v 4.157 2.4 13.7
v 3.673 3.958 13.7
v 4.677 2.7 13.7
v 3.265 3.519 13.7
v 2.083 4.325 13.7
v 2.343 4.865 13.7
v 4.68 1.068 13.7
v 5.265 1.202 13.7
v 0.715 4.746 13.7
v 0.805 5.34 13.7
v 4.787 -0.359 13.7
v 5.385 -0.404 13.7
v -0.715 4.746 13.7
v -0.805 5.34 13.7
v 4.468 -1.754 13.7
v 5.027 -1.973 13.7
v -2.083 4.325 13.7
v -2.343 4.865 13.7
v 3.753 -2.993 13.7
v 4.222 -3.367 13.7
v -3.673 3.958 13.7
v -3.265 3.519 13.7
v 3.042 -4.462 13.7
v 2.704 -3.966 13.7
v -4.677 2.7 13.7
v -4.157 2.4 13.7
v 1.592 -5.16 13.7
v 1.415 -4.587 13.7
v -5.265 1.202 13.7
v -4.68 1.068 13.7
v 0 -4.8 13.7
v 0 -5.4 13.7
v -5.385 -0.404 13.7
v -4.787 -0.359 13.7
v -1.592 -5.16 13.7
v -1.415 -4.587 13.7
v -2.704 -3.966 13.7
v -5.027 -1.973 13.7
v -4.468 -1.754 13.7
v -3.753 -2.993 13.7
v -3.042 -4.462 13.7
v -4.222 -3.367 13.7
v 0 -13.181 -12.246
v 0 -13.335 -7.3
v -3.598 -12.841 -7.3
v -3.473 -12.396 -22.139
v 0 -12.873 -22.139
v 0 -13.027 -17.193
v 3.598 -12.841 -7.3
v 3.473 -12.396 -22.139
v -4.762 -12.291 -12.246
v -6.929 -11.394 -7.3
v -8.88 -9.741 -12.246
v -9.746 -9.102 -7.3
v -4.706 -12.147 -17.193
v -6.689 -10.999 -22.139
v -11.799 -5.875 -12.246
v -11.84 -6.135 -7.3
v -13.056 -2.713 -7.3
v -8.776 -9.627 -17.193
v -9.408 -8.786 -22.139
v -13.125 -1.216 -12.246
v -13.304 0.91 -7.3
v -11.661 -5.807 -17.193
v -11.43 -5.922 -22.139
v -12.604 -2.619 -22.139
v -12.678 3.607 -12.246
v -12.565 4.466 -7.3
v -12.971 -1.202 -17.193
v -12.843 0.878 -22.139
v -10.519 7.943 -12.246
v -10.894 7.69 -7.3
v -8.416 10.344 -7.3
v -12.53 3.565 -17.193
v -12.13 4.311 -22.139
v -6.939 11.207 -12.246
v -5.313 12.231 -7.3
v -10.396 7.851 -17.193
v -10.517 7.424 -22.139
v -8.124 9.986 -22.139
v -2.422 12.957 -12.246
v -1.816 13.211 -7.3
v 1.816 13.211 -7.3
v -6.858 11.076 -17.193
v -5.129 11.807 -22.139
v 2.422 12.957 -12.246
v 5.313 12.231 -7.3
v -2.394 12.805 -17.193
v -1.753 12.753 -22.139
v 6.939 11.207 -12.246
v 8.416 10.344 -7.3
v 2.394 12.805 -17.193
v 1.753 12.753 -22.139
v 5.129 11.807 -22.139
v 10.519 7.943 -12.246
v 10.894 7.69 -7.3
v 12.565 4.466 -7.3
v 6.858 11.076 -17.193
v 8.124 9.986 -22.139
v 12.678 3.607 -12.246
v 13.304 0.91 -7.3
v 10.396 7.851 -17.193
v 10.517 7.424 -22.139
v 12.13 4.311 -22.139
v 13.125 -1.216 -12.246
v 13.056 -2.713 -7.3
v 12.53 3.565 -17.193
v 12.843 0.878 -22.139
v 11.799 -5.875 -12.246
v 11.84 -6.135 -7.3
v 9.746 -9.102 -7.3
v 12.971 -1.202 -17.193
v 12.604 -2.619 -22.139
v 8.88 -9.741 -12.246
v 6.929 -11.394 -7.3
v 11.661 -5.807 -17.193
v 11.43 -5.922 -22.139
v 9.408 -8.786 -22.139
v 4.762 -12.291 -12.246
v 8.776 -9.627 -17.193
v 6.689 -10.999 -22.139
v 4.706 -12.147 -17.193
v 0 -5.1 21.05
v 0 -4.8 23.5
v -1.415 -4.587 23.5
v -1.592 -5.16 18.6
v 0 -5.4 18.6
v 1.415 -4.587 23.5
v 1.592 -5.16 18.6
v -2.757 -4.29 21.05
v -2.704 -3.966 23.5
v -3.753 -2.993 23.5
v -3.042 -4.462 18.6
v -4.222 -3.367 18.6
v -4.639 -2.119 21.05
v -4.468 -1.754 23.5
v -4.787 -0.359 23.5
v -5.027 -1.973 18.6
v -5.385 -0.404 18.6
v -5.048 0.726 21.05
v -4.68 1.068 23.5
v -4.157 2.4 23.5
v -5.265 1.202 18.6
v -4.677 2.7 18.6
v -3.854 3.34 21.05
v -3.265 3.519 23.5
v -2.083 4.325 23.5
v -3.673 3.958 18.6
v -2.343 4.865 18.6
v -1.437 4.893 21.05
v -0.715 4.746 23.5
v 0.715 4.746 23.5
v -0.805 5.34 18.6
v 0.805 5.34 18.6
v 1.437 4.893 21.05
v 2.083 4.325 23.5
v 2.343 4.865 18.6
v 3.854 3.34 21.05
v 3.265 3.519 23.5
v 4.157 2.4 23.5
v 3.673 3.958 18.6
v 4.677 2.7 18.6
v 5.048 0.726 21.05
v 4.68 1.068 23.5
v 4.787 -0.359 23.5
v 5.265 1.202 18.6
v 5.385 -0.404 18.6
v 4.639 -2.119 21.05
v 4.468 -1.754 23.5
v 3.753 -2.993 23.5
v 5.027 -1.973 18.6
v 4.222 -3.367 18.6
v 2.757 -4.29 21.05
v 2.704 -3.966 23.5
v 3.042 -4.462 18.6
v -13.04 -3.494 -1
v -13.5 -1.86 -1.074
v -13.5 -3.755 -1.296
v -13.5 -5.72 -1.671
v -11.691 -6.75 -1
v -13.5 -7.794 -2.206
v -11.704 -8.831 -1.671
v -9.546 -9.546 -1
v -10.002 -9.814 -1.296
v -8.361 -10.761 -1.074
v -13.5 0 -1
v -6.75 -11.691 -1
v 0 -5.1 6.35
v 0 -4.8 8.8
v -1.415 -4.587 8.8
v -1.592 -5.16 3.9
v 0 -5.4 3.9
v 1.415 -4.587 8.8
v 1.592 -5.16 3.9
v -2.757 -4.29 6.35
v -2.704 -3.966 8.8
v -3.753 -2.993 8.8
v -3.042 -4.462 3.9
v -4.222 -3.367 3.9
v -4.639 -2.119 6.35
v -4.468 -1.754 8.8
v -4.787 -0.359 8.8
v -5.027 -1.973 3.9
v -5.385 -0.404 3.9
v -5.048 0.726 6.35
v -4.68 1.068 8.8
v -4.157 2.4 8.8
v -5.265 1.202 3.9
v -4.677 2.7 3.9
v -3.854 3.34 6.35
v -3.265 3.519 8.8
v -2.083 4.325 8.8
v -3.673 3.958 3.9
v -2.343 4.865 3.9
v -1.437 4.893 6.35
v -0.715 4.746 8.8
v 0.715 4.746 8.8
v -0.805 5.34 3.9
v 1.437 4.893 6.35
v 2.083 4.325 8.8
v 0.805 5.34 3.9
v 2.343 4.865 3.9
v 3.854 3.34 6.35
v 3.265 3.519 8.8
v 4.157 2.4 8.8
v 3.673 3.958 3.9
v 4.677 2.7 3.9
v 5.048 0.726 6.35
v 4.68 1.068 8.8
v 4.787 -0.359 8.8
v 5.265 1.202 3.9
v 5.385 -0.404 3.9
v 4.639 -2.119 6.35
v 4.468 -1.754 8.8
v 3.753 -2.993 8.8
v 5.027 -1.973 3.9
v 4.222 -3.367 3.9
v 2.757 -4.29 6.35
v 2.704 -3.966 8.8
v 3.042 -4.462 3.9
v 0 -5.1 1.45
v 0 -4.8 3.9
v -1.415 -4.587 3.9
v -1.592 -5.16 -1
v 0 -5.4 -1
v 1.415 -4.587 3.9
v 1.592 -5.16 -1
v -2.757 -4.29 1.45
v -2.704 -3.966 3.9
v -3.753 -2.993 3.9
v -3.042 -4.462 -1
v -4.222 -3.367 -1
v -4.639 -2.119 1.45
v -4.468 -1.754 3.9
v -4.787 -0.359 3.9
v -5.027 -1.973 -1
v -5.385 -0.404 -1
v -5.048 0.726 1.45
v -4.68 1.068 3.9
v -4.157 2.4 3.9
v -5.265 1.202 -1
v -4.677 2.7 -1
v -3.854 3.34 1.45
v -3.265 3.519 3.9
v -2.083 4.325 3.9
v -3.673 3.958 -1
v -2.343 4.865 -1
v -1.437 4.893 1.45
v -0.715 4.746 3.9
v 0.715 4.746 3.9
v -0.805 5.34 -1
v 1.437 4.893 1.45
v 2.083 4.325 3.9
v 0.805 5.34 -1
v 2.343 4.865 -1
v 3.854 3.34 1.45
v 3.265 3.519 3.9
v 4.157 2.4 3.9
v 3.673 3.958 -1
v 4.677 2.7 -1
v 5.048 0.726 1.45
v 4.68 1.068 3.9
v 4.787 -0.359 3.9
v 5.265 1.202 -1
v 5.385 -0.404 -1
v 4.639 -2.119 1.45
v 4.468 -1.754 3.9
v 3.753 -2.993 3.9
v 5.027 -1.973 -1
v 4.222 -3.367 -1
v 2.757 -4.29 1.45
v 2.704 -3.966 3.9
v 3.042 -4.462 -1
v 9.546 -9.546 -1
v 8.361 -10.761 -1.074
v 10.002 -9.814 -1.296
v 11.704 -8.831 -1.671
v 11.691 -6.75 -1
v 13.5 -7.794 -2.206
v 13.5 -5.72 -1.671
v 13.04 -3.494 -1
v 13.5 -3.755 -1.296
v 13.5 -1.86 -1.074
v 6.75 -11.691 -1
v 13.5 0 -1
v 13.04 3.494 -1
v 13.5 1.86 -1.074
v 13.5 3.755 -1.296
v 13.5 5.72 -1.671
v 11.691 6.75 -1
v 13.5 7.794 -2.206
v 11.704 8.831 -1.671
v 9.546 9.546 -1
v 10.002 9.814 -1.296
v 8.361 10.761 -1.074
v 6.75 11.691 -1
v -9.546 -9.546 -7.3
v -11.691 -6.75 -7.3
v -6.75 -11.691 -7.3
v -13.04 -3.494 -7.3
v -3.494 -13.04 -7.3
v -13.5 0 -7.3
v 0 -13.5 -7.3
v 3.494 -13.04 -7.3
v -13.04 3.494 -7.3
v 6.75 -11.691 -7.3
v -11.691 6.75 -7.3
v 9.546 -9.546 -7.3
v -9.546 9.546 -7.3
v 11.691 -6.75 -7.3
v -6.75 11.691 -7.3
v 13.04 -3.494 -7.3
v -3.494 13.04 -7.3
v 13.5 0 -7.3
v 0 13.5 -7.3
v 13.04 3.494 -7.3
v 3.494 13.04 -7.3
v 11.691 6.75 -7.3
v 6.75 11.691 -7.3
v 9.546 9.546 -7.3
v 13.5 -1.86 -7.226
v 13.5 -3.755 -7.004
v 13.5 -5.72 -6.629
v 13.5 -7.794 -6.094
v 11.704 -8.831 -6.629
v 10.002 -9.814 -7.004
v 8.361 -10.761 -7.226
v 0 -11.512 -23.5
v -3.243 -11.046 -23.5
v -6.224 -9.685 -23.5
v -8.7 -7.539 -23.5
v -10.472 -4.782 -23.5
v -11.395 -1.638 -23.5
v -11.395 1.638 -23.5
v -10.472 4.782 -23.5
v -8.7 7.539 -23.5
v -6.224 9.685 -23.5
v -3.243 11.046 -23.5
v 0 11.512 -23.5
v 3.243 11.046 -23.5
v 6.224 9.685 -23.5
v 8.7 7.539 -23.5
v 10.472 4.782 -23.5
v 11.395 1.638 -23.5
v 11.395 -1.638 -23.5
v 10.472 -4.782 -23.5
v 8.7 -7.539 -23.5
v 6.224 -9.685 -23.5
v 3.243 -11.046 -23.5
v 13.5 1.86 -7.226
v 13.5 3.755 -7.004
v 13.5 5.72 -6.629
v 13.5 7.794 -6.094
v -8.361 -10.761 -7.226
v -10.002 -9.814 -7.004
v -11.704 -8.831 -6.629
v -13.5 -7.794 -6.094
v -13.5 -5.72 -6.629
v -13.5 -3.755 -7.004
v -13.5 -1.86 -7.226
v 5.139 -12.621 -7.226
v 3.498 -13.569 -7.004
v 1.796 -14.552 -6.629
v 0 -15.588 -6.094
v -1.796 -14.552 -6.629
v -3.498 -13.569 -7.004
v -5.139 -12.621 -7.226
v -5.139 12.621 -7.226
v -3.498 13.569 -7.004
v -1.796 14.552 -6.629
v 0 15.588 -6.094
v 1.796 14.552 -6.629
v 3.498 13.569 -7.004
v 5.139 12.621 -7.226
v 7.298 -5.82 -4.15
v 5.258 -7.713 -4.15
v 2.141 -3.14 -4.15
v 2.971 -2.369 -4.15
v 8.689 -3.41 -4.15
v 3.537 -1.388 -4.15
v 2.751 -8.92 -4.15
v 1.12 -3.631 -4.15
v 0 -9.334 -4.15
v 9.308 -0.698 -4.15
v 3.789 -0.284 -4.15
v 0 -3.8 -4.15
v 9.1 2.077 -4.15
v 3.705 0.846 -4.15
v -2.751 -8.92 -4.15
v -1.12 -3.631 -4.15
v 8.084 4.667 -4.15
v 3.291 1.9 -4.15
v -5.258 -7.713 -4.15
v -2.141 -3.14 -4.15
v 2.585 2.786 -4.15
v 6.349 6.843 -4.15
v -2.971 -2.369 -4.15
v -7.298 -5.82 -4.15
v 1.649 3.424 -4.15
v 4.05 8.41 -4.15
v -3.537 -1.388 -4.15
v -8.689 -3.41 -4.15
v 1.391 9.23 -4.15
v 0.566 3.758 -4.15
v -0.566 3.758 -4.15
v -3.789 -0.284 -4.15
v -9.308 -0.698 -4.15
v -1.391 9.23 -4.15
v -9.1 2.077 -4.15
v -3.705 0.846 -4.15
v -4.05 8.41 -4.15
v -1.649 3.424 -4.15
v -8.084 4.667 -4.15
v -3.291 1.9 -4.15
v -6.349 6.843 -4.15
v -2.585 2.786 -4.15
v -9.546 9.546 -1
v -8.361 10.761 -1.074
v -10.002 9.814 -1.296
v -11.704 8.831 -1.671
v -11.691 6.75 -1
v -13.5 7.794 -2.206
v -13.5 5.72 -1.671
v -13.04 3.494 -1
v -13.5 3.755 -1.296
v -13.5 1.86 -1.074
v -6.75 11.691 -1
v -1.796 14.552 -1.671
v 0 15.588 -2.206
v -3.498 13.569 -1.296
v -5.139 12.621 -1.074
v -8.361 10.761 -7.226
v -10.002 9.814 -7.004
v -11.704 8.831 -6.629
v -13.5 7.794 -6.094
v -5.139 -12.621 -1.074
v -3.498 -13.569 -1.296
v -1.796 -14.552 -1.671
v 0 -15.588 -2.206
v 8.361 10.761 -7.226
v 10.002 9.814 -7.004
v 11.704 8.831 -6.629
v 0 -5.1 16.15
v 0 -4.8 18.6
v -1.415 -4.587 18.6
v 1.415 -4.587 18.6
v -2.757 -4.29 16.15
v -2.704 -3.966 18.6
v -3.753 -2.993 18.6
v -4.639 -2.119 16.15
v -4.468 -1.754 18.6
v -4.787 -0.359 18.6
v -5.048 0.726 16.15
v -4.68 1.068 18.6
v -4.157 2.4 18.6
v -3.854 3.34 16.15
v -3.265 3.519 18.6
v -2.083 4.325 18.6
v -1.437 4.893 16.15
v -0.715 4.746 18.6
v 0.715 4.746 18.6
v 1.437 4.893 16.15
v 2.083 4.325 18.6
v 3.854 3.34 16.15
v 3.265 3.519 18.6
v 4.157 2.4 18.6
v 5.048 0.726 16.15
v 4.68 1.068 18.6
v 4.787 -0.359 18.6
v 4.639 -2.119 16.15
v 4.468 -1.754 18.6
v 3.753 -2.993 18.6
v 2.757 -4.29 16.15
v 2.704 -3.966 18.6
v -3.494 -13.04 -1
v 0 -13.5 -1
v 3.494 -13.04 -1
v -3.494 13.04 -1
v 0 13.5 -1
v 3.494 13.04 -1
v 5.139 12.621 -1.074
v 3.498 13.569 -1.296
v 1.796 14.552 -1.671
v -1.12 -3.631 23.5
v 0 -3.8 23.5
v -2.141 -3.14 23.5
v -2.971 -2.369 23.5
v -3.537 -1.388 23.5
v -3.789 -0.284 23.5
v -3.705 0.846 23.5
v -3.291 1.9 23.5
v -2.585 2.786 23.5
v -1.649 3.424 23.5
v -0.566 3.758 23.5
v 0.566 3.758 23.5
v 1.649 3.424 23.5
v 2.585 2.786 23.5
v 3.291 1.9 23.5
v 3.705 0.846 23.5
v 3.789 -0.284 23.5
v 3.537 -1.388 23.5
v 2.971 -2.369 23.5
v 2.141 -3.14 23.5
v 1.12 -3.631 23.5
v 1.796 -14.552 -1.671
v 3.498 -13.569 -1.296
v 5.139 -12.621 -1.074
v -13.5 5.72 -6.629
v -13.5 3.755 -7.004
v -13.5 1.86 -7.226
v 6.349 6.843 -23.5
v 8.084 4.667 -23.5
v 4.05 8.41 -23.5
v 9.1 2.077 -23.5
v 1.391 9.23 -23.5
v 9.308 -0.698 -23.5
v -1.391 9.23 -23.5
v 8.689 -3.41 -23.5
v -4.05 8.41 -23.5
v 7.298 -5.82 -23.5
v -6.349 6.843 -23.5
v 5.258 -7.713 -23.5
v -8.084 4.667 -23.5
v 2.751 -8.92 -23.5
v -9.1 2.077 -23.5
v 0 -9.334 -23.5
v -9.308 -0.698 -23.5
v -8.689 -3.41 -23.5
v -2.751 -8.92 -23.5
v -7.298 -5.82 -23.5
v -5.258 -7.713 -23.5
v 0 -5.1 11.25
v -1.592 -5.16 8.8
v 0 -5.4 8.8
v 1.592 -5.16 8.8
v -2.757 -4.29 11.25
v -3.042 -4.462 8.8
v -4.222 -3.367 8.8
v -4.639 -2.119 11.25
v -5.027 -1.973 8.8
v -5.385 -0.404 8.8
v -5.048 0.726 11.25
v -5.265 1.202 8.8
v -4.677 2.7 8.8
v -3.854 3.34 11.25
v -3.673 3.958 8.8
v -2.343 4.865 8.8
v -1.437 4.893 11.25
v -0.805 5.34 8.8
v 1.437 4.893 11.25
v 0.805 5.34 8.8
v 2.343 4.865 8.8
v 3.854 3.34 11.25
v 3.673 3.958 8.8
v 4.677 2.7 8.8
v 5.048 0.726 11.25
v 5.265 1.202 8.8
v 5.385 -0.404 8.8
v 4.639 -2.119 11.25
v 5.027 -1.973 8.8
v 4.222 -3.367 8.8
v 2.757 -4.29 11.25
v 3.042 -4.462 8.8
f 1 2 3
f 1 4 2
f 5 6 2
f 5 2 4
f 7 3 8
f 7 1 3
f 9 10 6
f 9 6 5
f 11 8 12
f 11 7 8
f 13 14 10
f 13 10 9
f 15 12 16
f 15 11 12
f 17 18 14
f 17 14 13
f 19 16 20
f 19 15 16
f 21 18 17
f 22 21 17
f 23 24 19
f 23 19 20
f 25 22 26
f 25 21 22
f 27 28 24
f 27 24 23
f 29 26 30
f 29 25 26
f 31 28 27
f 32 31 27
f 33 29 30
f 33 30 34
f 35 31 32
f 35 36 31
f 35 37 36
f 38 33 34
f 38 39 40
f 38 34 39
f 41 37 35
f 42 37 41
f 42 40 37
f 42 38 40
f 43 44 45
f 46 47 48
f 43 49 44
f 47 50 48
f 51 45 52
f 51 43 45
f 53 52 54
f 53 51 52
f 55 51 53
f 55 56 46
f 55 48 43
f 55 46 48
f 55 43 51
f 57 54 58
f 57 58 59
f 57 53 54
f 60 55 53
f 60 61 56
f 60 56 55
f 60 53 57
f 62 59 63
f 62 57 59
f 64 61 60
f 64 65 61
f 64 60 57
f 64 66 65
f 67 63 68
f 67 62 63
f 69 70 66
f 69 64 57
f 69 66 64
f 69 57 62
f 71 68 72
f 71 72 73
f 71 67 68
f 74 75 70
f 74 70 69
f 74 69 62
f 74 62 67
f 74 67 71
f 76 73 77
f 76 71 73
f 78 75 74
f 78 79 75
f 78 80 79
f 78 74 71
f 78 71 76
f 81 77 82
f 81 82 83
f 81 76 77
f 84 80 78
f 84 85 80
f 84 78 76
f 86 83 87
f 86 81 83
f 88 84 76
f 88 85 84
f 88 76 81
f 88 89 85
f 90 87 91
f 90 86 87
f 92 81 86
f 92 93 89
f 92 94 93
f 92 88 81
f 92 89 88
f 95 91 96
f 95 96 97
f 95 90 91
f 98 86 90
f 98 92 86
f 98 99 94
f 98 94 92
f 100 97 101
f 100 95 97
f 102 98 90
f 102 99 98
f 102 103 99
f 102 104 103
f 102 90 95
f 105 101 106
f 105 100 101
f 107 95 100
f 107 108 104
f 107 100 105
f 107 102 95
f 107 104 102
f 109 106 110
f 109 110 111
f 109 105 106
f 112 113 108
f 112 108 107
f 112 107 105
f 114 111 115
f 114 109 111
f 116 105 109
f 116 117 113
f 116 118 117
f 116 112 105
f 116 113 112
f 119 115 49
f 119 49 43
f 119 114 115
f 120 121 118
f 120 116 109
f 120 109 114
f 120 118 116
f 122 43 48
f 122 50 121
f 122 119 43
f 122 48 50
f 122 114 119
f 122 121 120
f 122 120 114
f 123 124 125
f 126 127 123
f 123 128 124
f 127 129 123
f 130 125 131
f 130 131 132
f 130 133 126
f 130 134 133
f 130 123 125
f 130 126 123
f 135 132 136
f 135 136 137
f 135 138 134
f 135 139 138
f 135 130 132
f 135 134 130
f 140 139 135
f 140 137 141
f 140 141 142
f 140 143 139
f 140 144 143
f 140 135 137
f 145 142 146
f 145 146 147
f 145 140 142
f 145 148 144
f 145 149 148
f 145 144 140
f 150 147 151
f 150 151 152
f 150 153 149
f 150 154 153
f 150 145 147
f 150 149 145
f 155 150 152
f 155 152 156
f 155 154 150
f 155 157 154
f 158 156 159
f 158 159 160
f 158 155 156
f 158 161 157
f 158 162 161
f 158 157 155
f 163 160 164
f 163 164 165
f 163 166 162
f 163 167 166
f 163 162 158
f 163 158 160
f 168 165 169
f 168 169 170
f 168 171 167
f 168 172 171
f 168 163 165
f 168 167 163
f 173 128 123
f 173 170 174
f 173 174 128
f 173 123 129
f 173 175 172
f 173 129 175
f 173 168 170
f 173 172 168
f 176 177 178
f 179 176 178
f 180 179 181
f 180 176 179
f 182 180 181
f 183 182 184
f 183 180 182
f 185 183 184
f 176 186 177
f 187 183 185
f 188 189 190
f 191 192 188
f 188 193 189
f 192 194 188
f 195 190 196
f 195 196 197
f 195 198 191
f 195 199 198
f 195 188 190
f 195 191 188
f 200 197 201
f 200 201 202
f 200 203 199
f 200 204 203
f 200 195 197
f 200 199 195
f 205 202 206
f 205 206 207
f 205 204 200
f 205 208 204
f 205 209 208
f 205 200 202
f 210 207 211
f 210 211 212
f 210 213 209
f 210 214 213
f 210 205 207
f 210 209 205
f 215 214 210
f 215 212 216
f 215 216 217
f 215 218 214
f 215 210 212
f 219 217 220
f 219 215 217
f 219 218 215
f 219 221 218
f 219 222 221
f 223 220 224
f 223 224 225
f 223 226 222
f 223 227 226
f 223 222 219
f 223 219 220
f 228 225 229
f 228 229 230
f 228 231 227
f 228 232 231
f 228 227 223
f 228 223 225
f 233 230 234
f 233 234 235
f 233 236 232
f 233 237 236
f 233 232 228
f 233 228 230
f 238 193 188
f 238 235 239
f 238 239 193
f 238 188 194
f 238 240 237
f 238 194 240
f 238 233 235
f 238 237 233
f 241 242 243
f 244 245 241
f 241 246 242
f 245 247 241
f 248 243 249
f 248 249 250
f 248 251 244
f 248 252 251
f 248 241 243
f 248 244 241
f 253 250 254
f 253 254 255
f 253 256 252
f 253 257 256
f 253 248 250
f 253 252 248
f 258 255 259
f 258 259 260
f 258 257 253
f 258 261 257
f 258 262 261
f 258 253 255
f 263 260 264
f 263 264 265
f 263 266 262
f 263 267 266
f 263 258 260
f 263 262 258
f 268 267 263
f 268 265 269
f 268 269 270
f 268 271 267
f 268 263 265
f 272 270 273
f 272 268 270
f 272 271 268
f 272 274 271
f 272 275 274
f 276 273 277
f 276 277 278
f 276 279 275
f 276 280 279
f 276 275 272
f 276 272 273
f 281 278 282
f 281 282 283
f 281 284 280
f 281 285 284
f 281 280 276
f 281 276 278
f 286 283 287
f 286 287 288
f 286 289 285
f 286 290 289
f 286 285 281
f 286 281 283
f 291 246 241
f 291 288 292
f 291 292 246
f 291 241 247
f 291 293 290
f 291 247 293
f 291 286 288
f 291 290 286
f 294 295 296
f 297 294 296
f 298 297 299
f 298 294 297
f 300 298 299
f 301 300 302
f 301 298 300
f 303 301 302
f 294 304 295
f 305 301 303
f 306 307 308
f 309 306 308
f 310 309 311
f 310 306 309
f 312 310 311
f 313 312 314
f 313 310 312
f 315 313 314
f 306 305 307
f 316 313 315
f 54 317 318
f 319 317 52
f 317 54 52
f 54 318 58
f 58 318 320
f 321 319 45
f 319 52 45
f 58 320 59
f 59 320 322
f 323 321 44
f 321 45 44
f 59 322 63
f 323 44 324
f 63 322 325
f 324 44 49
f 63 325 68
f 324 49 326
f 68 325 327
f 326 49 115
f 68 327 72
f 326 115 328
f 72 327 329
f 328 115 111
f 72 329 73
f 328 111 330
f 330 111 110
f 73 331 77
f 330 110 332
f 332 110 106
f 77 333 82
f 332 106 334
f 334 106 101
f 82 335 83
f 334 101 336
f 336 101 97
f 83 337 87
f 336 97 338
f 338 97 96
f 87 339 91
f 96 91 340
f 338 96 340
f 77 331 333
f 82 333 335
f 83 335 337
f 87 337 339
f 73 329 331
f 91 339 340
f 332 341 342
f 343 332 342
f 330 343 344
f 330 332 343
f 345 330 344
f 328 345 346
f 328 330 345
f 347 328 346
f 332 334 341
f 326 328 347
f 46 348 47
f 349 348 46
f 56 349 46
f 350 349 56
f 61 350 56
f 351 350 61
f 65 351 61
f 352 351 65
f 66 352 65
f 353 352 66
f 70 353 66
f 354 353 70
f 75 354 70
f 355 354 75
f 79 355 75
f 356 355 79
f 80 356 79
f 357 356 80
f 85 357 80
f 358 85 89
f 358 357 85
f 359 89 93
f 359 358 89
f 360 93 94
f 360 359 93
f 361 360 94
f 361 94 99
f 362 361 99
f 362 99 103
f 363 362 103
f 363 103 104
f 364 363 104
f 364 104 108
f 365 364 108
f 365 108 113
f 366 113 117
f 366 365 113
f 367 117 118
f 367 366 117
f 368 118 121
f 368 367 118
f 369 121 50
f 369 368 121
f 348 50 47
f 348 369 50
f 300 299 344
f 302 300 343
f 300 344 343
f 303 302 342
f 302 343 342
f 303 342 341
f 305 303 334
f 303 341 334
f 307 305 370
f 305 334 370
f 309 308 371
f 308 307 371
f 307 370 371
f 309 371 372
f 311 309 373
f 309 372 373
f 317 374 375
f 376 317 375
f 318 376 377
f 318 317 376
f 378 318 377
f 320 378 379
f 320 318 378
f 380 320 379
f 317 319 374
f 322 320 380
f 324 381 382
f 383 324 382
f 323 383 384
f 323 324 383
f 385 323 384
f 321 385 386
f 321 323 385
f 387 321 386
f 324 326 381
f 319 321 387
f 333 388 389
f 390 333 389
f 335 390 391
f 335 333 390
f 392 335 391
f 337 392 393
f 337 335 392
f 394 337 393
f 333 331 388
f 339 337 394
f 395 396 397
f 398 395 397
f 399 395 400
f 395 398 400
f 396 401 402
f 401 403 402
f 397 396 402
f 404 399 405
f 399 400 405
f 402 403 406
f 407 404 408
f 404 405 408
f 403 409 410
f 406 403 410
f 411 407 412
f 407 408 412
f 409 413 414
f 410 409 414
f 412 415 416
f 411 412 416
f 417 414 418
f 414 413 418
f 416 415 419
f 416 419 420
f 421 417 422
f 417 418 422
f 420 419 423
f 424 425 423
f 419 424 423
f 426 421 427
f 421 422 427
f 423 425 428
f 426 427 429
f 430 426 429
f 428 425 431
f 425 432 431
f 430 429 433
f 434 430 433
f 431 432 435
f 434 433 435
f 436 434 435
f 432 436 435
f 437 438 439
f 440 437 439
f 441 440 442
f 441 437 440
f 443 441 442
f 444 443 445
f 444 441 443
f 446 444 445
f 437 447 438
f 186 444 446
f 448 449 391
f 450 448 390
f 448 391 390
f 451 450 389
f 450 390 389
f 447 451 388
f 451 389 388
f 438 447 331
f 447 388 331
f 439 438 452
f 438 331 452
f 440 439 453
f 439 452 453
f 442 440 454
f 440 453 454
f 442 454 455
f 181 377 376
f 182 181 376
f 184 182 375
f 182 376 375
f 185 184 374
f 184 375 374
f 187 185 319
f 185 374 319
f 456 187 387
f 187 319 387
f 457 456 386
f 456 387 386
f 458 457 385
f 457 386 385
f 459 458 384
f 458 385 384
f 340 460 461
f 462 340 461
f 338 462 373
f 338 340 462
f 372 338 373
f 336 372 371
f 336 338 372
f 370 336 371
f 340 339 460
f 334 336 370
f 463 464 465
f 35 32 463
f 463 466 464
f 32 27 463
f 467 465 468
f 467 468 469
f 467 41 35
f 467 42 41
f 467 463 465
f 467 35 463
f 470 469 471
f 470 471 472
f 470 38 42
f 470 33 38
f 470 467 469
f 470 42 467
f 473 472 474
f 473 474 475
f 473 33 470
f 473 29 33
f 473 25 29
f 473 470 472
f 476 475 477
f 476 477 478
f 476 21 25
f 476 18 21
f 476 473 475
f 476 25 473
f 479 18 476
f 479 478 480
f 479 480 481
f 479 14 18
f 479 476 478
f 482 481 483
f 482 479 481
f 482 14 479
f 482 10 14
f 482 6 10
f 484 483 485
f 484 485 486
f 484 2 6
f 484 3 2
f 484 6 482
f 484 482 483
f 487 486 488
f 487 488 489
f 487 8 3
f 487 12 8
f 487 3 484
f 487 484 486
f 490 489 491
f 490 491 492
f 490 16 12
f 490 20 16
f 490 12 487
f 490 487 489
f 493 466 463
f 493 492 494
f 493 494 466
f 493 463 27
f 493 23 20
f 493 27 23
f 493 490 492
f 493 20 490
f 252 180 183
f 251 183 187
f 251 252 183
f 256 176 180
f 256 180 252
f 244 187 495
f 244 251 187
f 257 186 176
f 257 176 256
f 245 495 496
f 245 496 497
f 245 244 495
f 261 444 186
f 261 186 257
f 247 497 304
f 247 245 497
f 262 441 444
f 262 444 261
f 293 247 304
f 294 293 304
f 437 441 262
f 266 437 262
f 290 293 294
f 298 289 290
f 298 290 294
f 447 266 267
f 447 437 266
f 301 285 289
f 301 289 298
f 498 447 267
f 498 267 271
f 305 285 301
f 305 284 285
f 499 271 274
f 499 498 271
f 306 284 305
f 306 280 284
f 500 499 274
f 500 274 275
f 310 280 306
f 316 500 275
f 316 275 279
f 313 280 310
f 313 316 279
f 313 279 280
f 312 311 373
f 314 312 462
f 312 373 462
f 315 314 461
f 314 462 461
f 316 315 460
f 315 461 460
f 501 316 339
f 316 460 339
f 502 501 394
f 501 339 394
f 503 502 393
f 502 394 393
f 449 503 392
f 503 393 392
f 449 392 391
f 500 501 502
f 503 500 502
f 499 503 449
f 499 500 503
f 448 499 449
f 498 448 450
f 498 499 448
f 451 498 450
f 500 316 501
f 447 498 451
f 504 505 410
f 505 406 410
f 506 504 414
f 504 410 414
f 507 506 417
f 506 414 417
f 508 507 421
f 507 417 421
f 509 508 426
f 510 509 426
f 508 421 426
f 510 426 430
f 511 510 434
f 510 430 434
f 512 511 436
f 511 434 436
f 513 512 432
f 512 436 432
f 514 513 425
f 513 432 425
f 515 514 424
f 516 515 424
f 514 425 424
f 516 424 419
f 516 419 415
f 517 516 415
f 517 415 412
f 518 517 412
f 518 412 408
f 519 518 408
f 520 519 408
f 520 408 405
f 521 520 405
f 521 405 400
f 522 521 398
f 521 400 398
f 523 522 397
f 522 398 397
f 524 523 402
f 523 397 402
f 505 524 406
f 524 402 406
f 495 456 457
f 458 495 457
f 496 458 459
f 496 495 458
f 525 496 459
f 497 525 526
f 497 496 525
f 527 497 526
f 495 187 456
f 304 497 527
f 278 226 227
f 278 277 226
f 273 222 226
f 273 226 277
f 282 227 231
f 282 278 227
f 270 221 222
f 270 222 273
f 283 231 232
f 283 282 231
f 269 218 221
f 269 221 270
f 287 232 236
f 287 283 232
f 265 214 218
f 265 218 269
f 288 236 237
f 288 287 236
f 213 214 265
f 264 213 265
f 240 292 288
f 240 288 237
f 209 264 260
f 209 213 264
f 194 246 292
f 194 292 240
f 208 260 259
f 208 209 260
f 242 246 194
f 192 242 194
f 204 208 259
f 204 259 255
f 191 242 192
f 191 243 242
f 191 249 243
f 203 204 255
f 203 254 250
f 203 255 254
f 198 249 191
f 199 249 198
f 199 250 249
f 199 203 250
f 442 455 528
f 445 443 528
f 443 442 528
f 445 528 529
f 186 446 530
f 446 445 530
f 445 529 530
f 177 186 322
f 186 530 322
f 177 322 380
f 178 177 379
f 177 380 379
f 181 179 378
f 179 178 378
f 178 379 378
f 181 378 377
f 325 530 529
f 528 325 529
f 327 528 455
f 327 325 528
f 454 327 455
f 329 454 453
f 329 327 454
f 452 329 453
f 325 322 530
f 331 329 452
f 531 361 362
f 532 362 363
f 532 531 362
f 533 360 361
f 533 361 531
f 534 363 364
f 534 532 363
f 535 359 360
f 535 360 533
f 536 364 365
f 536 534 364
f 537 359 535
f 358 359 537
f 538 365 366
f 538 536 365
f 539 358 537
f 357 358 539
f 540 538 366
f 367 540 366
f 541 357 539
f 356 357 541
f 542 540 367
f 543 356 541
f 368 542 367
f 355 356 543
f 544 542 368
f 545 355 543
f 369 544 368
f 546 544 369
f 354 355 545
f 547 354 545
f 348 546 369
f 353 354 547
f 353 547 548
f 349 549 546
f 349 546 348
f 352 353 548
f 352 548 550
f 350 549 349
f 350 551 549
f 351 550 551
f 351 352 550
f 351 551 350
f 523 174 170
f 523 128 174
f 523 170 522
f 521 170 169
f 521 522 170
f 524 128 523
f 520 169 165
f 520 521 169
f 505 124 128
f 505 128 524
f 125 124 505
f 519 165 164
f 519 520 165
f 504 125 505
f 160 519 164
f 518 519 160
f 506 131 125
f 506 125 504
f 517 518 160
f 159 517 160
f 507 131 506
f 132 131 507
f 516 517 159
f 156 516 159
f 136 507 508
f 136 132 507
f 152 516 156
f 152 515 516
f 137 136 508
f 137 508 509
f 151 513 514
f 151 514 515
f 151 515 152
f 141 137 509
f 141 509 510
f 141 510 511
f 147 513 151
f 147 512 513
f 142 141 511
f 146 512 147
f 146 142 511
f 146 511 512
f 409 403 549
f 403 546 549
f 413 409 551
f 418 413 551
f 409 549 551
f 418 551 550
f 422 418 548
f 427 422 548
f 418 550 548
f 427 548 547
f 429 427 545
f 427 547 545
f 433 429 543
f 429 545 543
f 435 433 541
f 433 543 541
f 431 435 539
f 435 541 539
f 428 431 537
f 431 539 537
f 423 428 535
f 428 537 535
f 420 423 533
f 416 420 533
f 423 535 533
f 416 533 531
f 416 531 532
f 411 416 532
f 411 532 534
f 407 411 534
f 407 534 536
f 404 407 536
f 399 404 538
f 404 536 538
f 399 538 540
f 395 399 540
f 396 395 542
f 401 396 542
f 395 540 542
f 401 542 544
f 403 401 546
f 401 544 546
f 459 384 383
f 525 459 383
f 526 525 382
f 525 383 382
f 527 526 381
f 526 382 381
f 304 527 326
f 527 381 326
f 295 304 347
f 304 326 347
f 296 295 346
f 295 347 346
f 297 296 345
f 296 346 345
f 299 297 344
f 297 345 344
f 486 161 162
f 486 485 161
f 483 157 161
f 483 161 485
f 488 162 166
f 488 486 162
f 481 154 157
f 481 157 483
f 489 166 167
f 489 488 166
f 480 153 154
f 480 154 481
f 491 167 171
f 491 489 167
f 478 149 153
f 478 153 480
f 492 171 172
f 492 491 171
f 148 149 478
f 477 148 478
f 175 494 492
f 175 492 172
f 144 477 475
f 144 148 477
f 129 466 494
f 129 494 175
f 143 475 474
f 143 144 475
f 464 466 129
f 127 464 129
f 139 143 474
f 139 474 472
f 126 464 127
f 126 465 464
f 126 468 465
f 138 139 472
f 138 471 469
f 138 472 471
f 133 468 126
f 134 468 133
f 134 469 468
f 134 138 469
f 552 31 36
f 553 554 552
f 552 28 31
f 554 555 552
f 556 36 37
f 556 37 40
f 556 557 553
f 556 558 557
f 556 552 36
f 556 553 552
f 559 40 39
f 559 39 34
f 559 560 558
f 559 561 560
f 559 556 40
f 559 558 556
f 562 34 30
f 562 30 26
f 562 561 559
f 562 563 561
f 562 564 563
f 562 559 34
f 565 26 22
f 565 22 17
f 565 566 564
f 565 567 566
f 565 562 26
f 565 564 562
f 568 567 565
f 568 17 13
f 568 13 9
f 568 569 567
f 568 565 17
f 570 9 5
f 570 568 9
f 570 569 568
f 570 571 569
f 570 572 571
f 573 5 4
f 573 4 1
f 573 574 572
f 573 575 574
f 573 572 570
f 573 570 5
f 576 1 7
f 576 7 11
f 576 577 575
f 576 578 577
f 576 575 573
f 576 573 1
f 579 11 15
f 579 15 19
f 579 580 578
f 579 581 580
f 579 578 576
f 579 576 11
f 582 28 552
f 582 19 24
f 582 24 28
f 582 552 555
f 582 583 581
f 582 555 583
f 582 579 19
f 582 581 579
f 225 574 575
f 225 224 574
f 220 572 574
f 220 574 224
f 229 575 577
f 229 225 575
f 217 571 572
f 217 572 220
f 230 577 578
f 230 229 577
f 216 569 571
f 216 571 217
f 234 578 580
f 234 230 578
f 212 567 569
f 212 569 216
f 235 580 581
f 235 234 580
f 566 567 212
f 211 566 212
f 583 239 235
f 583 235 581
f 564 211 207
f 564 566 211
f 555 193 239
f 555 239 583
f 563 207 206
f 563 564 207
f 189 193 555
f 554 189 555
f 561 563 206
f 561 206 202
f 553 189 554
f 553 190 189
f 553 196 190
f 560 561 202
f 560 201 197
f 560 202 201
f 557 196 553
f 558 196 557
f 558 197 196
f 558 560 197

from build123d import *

# Parameters (mm, degrees)
LPATTERN1_COUNT     = 5
LPATTERN1_PITCH     = 4.9
BOSS_EXTRUDE1_START = -7.3
BOSS_EXTRUDE1_DEPTH = 6.3
SKETCH5_OUTSIDE_W   = 153.692
SKETCH5_OUTSIDE_H   = 157.868
SKETCH5_OUTSIDE_R   = 13.5
CUT_EXTRUDE1_DEPTH  = 33.023428923
CUT_EXTRUDE1_DRAFT  = -60
SKETCH6_OUTSIDE_W   = 171.16
SKETCH6_OUTSIDE_H   = 175.336
SKETCH6_OUTSIDE_R   = 13.5
CUT_EXTRUDE2_DEPTH  = 38.066022177
CUT_EXTRUDE2_DRAFT  = -60


with BuildPart() as part:
    # Sketch2 → Revolve2 (revolve)
    with BuildSketch(Plane(origin=(0, 0, 0), x_dir=(0, 0, -1), z_dir=(1, 0, 0)), mode=Mode.PRIVATE) as revolve2_sk:
        Polygon((-23.5, 4.8), (-18.6, 5.4), (-18.6, 0), (-23.5, 0), align=None)
    revolve(revolve2_sk.sketch.rotate(Axis((0, 0, 23.5), (0, 0, -1)), 180), axis=Axis((0, 0, 23.5), (0, 0, -1)))


with BuildPart() as lpattern1_1:
    # LPattern1: pattern copy
    add(part.part.moved(Location(Vector(0, 0, -1) * (1 * LPATTERN1_PITCH))))


with BuildPart() as lpattern1_2:
    # LPattern1: pattern copy
    add(part.part.moved(Location(Vector(0, 0, -1) * (2 * LPATTERN1_PITCH))))


with BuildPart() as lpattern1_3:
    # LPattern1: pattern copy
    add(part.part.moved(Location(Vector(0, 0, -1) * (3 * LPATTERN1_PITCH))))


with BuildPart() as lpattern1_4:
    # LPattern1: pattern copy
    add(part.part.moved(Location(Vector(0, 0, -1) * (4 * LPATTERN1_PITCH))))


with BuildPart() as body_6:
    # Sketch3 → Boss-Extrude1 (new body)
    with BuildSketch(Plane.XY.offset(BOSS_EXTRUDE1_START)):
        Polygon((0, 15.588457268), (-13.5, 7.794228634), (-13.5, -7.794228634), (0, -15.588457268), (13.5, -7.794228634), (13.5, 7.794228634), align=None)
    extrude(amount=BOSS_EXTRUDE1_DEPTH)


with BuildPart() as cut_extrude1_tool:
    # Sketch5 outside → Cut-Extrude1 (with draft: the straight prism first)
    with BuildSketch(Plane.XY.offset(-1)):
        Rectangle(SKETCH5_OUTSIDE_W, SKETCH5_OUTSIDE_H)
        Circle(SKETCH5_OUTSIDE_R, mode=Mode.SUBTRACT)
    extrude(amount=-CUT_EXTRUDE1_DEPTH)
    # Cut-Extrude1: the draft: its side faces are tilted about the plane it starts from
    cut_extrude1_sides = [cut_extrude1_tool.faces().sort_by_distance(p)[0] for p in [
        (0, -78.934, -17.511714462),
        (76.846, 0, -17.511714462),
        (0, 78.934, -17.511714462),
        (-76.846, 0, -17.511714462),
        (-13.5, 0, -17.511714462),
    ]]
    draft(cut_extrude1_sides, Plane.XY.offset(-1), CUT_EXTRUDE1_DRAFT)


with BuildPart() as body_6_1:
    add(body_6.part)

    # Cut-Extrude1: cut by cut_extrude1_tool
    add(cut_extrude1_tool.part, mode=Mode.SUBTRACT)


with BuildPart() as cut_extrude2_tool:
    # Sketch6 outside → Cut-Extrude2 (with draft: the straight prism first)
    with BuildSketch(Plane(origin=(0, 0, -7.3), x_dir=(-1, 0, 0), z_dir=(0, 0, -1))):
        Rectangle(SKETCH6_OUTSIDE_W, SKETCH6_OUTSIDE_H)
        Circle(SKETCH6_OUTSIDE_R, mode=Mode.SUBTRACT)
    extrude(amount=-CUT_EXTRUDE2_DEPTH)
    # Cut-Extrude2: the draft: its side faces are tilted about the plane it starts from
    cut_extrude2_sides = [cut_extrude2_tool.faces().sort_by_distance(p)[0] for p in [
        (0, -87.668, 11.733011088),
        (-85.58, 0, 11.733011088),
        (0, 87.668, 11.733011088),
        (85.58, 0, 11.733011088),
        (13.5, 0, 11.733011088),
    ]]
    draft(cut_extrude2_sides, Plane(origin=(0, 0, -7.3), x_dir=(-1, 0, 0), z_dir=(0, 0, -1)), CUT_EXTRUDE2_DRAFT)


with BuildPart() as body_6_2:
    add(body_6_1.part)

    # Cut-Extrude2: cut by cut_extrude2_tool
    add(cut_extrude2_tool.part, mode=Mode.SUBTRACT)


with BuildPart() as part_1:
    add(part.part)

    add(lpattern1_1.part)  # Revolve1 merges LPattern1_1

    add(lpattern1_2.part)  # Revolve1 merges LPattern1_2

    add(lpattern1_3.part)  # Revolve1 merges LPattern1_3

    add(lpattern1_4.part)  # Revolve1 merges LPattern1_4

    add(body_6_2.part)  # Revolve1 merges body 6
    # Sketch4 → Revolve1 (revolve)
    with BuildSketch(Plane(origin=(0, 0, 0), x_dir=(0, 0, -1), z_dir=(1, 0, 0)), mode=Mode.PRIVATE) as revolve1_sk:
        Polygon((-23.5, 4.8), (7.3, 4.8), (7.3, 13.335), (22.139285714, 12.872977456), (23.5, 11.51226317), (23.5, 0), (-23.5, 0), align=None)
    revolve(revolve1_sk.sketch.rotate(Axis((0, 0, 23.5), (0, 0, -1)), 180), axis=Axis((0, 0, 23.5), (0, 0, -1)))

    # Sketch7 → Cut-Revolve1 (revolve, cut)
    with BuildSketch(Plane(origin=(0, 0, 0), x_dir=(0, 0, -1), z_dir=(1, 0, 0)), mode=Mode.PRIVATE) as cut_revolve1_sk:
        Polygon((-23.5, 0), (-23.5, 3.8), (4.15, 3.8), (4.15, 9.3345), (23.5, 9.3345), (23.5, 0), align=None)
    revolve(cut_revolve1_sk.sketch.rotate(Axis((0, 0, 23.5), (0, 0, -1)), 180), axis=Axis((0, 0, 23.5), (0, 0, -1)), mode=Mode.SUBTRACT)


solid = part_1.part
